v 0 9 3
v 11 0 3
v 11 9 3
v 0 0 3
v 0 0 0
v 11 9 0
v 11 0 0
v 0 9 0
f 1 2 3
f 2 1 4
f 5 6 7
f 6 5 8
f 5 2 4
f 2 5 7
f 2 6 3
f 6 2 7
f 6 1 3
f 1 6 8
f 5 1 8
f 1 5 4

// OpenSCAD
// Generated by SolidPython 1.0.1 on 2020-07-29 00:46:55


cube(size = [11, 9, 3]);
/***********************************************
*********      SolidPython code:      **********
************************************************
 
# import packages: SolidPython
from solid import *
from solid.utils import *
from itertools import chain, combinations, permutations


class Resize:

    def __init__(self, scad_file):
        self.scad_file = scad_file
        #self.scad_file = import_scad(scad_file)
        # cone/cylinder param:
        self.r1 = 0
        self.r2 = 0
        self.h = 0
        # rectangular prism param:
        self.w = 0
        self.l = 0
        # ellipse param:
        self.r = 0

    # import OpenScad code (file name corresponds to shape)


    # classify shape + parameters
    def assign(self, param1, param2, param3):
        if self.scad_file == 'cone.scad':
            self.r1 = param1
            self.r2 = param2
            self.h = param3
        elif self.scad_file == 'cylinder.scad':
            self.r1 = param1
            self.r2 = param2
            self.h = param3
        elif self.scad_file == 'rectangularPrism.scad':
            self.h = param1
            self.l = param2
            self.w = param3
        else:
            self.r = param1
            self.h = param2

    # resize parameters
    def iterate(self):
        x = range(3, 20, 2)
        i = 1
        if self.scad_file == 'cone.scad':
            tempList = list(permutations(x, 2))
            for temp in tempList:
                param1 = temp[0]
                param2 = temp[1]
                filepath = 'produced_scad_files/' + 'cone' + str(param1) + '_' + str(param2) + '_' + '.scad'
                scad_render_to_file(cylinder(h=param1, r1=param2, r2=0), filepath)

        elif self.scad_file == 'cylinder.scad':
            tempList = list(permutations(x, 3))
            for temp in tempList:
                param1 = temp[0]
                param2 = temp[1]
                filepath = 'produced_scad_files/' + 'cylinder' + str(param1) + '_' + str(param2) + '_' + '.scad'
                scad_render_to_file(cylinder(h=param1, r1=param2, r2=param2), filepath)

        elif self.scad_file == 'rectangularPrism.scad':
            tempList = list(permutations(x, 3))
            for temp in tempList:
                param1 = temp[0]
                param2 = temp[1]
                param3 = temp[2]
                filepath = 'produced_scad_files/' + 'rectangularPrism' + str(param1) + '_' + str(param2) + '_' + str(
                    param3) + '.scad'
                scad_render_to_file(cube(size=(param1, param2, param3)), filepath)

        elif self.scad_file == 'ellipse.scad':
            tempList = list(permutations(x, 4))
            for temp in tempList:
                param1 = temp[0]
                param2 = temp[1]
                param3 = temp[2]
                param4 = temp[3]
                filepath = 'produced_scad_files/' + 'ellipse' + str(param1) + '_' + str(param2) + '_' + str(param3) + '_' + str(param4) + '.scad'
                scad_render_to_file(scale([param1, param2, param3])(sphere(r=param4)), filepath)

    def render_to_scadfile(self):
        scad_render_to_file(scad, 'example.scad') 
 
************************************************/
